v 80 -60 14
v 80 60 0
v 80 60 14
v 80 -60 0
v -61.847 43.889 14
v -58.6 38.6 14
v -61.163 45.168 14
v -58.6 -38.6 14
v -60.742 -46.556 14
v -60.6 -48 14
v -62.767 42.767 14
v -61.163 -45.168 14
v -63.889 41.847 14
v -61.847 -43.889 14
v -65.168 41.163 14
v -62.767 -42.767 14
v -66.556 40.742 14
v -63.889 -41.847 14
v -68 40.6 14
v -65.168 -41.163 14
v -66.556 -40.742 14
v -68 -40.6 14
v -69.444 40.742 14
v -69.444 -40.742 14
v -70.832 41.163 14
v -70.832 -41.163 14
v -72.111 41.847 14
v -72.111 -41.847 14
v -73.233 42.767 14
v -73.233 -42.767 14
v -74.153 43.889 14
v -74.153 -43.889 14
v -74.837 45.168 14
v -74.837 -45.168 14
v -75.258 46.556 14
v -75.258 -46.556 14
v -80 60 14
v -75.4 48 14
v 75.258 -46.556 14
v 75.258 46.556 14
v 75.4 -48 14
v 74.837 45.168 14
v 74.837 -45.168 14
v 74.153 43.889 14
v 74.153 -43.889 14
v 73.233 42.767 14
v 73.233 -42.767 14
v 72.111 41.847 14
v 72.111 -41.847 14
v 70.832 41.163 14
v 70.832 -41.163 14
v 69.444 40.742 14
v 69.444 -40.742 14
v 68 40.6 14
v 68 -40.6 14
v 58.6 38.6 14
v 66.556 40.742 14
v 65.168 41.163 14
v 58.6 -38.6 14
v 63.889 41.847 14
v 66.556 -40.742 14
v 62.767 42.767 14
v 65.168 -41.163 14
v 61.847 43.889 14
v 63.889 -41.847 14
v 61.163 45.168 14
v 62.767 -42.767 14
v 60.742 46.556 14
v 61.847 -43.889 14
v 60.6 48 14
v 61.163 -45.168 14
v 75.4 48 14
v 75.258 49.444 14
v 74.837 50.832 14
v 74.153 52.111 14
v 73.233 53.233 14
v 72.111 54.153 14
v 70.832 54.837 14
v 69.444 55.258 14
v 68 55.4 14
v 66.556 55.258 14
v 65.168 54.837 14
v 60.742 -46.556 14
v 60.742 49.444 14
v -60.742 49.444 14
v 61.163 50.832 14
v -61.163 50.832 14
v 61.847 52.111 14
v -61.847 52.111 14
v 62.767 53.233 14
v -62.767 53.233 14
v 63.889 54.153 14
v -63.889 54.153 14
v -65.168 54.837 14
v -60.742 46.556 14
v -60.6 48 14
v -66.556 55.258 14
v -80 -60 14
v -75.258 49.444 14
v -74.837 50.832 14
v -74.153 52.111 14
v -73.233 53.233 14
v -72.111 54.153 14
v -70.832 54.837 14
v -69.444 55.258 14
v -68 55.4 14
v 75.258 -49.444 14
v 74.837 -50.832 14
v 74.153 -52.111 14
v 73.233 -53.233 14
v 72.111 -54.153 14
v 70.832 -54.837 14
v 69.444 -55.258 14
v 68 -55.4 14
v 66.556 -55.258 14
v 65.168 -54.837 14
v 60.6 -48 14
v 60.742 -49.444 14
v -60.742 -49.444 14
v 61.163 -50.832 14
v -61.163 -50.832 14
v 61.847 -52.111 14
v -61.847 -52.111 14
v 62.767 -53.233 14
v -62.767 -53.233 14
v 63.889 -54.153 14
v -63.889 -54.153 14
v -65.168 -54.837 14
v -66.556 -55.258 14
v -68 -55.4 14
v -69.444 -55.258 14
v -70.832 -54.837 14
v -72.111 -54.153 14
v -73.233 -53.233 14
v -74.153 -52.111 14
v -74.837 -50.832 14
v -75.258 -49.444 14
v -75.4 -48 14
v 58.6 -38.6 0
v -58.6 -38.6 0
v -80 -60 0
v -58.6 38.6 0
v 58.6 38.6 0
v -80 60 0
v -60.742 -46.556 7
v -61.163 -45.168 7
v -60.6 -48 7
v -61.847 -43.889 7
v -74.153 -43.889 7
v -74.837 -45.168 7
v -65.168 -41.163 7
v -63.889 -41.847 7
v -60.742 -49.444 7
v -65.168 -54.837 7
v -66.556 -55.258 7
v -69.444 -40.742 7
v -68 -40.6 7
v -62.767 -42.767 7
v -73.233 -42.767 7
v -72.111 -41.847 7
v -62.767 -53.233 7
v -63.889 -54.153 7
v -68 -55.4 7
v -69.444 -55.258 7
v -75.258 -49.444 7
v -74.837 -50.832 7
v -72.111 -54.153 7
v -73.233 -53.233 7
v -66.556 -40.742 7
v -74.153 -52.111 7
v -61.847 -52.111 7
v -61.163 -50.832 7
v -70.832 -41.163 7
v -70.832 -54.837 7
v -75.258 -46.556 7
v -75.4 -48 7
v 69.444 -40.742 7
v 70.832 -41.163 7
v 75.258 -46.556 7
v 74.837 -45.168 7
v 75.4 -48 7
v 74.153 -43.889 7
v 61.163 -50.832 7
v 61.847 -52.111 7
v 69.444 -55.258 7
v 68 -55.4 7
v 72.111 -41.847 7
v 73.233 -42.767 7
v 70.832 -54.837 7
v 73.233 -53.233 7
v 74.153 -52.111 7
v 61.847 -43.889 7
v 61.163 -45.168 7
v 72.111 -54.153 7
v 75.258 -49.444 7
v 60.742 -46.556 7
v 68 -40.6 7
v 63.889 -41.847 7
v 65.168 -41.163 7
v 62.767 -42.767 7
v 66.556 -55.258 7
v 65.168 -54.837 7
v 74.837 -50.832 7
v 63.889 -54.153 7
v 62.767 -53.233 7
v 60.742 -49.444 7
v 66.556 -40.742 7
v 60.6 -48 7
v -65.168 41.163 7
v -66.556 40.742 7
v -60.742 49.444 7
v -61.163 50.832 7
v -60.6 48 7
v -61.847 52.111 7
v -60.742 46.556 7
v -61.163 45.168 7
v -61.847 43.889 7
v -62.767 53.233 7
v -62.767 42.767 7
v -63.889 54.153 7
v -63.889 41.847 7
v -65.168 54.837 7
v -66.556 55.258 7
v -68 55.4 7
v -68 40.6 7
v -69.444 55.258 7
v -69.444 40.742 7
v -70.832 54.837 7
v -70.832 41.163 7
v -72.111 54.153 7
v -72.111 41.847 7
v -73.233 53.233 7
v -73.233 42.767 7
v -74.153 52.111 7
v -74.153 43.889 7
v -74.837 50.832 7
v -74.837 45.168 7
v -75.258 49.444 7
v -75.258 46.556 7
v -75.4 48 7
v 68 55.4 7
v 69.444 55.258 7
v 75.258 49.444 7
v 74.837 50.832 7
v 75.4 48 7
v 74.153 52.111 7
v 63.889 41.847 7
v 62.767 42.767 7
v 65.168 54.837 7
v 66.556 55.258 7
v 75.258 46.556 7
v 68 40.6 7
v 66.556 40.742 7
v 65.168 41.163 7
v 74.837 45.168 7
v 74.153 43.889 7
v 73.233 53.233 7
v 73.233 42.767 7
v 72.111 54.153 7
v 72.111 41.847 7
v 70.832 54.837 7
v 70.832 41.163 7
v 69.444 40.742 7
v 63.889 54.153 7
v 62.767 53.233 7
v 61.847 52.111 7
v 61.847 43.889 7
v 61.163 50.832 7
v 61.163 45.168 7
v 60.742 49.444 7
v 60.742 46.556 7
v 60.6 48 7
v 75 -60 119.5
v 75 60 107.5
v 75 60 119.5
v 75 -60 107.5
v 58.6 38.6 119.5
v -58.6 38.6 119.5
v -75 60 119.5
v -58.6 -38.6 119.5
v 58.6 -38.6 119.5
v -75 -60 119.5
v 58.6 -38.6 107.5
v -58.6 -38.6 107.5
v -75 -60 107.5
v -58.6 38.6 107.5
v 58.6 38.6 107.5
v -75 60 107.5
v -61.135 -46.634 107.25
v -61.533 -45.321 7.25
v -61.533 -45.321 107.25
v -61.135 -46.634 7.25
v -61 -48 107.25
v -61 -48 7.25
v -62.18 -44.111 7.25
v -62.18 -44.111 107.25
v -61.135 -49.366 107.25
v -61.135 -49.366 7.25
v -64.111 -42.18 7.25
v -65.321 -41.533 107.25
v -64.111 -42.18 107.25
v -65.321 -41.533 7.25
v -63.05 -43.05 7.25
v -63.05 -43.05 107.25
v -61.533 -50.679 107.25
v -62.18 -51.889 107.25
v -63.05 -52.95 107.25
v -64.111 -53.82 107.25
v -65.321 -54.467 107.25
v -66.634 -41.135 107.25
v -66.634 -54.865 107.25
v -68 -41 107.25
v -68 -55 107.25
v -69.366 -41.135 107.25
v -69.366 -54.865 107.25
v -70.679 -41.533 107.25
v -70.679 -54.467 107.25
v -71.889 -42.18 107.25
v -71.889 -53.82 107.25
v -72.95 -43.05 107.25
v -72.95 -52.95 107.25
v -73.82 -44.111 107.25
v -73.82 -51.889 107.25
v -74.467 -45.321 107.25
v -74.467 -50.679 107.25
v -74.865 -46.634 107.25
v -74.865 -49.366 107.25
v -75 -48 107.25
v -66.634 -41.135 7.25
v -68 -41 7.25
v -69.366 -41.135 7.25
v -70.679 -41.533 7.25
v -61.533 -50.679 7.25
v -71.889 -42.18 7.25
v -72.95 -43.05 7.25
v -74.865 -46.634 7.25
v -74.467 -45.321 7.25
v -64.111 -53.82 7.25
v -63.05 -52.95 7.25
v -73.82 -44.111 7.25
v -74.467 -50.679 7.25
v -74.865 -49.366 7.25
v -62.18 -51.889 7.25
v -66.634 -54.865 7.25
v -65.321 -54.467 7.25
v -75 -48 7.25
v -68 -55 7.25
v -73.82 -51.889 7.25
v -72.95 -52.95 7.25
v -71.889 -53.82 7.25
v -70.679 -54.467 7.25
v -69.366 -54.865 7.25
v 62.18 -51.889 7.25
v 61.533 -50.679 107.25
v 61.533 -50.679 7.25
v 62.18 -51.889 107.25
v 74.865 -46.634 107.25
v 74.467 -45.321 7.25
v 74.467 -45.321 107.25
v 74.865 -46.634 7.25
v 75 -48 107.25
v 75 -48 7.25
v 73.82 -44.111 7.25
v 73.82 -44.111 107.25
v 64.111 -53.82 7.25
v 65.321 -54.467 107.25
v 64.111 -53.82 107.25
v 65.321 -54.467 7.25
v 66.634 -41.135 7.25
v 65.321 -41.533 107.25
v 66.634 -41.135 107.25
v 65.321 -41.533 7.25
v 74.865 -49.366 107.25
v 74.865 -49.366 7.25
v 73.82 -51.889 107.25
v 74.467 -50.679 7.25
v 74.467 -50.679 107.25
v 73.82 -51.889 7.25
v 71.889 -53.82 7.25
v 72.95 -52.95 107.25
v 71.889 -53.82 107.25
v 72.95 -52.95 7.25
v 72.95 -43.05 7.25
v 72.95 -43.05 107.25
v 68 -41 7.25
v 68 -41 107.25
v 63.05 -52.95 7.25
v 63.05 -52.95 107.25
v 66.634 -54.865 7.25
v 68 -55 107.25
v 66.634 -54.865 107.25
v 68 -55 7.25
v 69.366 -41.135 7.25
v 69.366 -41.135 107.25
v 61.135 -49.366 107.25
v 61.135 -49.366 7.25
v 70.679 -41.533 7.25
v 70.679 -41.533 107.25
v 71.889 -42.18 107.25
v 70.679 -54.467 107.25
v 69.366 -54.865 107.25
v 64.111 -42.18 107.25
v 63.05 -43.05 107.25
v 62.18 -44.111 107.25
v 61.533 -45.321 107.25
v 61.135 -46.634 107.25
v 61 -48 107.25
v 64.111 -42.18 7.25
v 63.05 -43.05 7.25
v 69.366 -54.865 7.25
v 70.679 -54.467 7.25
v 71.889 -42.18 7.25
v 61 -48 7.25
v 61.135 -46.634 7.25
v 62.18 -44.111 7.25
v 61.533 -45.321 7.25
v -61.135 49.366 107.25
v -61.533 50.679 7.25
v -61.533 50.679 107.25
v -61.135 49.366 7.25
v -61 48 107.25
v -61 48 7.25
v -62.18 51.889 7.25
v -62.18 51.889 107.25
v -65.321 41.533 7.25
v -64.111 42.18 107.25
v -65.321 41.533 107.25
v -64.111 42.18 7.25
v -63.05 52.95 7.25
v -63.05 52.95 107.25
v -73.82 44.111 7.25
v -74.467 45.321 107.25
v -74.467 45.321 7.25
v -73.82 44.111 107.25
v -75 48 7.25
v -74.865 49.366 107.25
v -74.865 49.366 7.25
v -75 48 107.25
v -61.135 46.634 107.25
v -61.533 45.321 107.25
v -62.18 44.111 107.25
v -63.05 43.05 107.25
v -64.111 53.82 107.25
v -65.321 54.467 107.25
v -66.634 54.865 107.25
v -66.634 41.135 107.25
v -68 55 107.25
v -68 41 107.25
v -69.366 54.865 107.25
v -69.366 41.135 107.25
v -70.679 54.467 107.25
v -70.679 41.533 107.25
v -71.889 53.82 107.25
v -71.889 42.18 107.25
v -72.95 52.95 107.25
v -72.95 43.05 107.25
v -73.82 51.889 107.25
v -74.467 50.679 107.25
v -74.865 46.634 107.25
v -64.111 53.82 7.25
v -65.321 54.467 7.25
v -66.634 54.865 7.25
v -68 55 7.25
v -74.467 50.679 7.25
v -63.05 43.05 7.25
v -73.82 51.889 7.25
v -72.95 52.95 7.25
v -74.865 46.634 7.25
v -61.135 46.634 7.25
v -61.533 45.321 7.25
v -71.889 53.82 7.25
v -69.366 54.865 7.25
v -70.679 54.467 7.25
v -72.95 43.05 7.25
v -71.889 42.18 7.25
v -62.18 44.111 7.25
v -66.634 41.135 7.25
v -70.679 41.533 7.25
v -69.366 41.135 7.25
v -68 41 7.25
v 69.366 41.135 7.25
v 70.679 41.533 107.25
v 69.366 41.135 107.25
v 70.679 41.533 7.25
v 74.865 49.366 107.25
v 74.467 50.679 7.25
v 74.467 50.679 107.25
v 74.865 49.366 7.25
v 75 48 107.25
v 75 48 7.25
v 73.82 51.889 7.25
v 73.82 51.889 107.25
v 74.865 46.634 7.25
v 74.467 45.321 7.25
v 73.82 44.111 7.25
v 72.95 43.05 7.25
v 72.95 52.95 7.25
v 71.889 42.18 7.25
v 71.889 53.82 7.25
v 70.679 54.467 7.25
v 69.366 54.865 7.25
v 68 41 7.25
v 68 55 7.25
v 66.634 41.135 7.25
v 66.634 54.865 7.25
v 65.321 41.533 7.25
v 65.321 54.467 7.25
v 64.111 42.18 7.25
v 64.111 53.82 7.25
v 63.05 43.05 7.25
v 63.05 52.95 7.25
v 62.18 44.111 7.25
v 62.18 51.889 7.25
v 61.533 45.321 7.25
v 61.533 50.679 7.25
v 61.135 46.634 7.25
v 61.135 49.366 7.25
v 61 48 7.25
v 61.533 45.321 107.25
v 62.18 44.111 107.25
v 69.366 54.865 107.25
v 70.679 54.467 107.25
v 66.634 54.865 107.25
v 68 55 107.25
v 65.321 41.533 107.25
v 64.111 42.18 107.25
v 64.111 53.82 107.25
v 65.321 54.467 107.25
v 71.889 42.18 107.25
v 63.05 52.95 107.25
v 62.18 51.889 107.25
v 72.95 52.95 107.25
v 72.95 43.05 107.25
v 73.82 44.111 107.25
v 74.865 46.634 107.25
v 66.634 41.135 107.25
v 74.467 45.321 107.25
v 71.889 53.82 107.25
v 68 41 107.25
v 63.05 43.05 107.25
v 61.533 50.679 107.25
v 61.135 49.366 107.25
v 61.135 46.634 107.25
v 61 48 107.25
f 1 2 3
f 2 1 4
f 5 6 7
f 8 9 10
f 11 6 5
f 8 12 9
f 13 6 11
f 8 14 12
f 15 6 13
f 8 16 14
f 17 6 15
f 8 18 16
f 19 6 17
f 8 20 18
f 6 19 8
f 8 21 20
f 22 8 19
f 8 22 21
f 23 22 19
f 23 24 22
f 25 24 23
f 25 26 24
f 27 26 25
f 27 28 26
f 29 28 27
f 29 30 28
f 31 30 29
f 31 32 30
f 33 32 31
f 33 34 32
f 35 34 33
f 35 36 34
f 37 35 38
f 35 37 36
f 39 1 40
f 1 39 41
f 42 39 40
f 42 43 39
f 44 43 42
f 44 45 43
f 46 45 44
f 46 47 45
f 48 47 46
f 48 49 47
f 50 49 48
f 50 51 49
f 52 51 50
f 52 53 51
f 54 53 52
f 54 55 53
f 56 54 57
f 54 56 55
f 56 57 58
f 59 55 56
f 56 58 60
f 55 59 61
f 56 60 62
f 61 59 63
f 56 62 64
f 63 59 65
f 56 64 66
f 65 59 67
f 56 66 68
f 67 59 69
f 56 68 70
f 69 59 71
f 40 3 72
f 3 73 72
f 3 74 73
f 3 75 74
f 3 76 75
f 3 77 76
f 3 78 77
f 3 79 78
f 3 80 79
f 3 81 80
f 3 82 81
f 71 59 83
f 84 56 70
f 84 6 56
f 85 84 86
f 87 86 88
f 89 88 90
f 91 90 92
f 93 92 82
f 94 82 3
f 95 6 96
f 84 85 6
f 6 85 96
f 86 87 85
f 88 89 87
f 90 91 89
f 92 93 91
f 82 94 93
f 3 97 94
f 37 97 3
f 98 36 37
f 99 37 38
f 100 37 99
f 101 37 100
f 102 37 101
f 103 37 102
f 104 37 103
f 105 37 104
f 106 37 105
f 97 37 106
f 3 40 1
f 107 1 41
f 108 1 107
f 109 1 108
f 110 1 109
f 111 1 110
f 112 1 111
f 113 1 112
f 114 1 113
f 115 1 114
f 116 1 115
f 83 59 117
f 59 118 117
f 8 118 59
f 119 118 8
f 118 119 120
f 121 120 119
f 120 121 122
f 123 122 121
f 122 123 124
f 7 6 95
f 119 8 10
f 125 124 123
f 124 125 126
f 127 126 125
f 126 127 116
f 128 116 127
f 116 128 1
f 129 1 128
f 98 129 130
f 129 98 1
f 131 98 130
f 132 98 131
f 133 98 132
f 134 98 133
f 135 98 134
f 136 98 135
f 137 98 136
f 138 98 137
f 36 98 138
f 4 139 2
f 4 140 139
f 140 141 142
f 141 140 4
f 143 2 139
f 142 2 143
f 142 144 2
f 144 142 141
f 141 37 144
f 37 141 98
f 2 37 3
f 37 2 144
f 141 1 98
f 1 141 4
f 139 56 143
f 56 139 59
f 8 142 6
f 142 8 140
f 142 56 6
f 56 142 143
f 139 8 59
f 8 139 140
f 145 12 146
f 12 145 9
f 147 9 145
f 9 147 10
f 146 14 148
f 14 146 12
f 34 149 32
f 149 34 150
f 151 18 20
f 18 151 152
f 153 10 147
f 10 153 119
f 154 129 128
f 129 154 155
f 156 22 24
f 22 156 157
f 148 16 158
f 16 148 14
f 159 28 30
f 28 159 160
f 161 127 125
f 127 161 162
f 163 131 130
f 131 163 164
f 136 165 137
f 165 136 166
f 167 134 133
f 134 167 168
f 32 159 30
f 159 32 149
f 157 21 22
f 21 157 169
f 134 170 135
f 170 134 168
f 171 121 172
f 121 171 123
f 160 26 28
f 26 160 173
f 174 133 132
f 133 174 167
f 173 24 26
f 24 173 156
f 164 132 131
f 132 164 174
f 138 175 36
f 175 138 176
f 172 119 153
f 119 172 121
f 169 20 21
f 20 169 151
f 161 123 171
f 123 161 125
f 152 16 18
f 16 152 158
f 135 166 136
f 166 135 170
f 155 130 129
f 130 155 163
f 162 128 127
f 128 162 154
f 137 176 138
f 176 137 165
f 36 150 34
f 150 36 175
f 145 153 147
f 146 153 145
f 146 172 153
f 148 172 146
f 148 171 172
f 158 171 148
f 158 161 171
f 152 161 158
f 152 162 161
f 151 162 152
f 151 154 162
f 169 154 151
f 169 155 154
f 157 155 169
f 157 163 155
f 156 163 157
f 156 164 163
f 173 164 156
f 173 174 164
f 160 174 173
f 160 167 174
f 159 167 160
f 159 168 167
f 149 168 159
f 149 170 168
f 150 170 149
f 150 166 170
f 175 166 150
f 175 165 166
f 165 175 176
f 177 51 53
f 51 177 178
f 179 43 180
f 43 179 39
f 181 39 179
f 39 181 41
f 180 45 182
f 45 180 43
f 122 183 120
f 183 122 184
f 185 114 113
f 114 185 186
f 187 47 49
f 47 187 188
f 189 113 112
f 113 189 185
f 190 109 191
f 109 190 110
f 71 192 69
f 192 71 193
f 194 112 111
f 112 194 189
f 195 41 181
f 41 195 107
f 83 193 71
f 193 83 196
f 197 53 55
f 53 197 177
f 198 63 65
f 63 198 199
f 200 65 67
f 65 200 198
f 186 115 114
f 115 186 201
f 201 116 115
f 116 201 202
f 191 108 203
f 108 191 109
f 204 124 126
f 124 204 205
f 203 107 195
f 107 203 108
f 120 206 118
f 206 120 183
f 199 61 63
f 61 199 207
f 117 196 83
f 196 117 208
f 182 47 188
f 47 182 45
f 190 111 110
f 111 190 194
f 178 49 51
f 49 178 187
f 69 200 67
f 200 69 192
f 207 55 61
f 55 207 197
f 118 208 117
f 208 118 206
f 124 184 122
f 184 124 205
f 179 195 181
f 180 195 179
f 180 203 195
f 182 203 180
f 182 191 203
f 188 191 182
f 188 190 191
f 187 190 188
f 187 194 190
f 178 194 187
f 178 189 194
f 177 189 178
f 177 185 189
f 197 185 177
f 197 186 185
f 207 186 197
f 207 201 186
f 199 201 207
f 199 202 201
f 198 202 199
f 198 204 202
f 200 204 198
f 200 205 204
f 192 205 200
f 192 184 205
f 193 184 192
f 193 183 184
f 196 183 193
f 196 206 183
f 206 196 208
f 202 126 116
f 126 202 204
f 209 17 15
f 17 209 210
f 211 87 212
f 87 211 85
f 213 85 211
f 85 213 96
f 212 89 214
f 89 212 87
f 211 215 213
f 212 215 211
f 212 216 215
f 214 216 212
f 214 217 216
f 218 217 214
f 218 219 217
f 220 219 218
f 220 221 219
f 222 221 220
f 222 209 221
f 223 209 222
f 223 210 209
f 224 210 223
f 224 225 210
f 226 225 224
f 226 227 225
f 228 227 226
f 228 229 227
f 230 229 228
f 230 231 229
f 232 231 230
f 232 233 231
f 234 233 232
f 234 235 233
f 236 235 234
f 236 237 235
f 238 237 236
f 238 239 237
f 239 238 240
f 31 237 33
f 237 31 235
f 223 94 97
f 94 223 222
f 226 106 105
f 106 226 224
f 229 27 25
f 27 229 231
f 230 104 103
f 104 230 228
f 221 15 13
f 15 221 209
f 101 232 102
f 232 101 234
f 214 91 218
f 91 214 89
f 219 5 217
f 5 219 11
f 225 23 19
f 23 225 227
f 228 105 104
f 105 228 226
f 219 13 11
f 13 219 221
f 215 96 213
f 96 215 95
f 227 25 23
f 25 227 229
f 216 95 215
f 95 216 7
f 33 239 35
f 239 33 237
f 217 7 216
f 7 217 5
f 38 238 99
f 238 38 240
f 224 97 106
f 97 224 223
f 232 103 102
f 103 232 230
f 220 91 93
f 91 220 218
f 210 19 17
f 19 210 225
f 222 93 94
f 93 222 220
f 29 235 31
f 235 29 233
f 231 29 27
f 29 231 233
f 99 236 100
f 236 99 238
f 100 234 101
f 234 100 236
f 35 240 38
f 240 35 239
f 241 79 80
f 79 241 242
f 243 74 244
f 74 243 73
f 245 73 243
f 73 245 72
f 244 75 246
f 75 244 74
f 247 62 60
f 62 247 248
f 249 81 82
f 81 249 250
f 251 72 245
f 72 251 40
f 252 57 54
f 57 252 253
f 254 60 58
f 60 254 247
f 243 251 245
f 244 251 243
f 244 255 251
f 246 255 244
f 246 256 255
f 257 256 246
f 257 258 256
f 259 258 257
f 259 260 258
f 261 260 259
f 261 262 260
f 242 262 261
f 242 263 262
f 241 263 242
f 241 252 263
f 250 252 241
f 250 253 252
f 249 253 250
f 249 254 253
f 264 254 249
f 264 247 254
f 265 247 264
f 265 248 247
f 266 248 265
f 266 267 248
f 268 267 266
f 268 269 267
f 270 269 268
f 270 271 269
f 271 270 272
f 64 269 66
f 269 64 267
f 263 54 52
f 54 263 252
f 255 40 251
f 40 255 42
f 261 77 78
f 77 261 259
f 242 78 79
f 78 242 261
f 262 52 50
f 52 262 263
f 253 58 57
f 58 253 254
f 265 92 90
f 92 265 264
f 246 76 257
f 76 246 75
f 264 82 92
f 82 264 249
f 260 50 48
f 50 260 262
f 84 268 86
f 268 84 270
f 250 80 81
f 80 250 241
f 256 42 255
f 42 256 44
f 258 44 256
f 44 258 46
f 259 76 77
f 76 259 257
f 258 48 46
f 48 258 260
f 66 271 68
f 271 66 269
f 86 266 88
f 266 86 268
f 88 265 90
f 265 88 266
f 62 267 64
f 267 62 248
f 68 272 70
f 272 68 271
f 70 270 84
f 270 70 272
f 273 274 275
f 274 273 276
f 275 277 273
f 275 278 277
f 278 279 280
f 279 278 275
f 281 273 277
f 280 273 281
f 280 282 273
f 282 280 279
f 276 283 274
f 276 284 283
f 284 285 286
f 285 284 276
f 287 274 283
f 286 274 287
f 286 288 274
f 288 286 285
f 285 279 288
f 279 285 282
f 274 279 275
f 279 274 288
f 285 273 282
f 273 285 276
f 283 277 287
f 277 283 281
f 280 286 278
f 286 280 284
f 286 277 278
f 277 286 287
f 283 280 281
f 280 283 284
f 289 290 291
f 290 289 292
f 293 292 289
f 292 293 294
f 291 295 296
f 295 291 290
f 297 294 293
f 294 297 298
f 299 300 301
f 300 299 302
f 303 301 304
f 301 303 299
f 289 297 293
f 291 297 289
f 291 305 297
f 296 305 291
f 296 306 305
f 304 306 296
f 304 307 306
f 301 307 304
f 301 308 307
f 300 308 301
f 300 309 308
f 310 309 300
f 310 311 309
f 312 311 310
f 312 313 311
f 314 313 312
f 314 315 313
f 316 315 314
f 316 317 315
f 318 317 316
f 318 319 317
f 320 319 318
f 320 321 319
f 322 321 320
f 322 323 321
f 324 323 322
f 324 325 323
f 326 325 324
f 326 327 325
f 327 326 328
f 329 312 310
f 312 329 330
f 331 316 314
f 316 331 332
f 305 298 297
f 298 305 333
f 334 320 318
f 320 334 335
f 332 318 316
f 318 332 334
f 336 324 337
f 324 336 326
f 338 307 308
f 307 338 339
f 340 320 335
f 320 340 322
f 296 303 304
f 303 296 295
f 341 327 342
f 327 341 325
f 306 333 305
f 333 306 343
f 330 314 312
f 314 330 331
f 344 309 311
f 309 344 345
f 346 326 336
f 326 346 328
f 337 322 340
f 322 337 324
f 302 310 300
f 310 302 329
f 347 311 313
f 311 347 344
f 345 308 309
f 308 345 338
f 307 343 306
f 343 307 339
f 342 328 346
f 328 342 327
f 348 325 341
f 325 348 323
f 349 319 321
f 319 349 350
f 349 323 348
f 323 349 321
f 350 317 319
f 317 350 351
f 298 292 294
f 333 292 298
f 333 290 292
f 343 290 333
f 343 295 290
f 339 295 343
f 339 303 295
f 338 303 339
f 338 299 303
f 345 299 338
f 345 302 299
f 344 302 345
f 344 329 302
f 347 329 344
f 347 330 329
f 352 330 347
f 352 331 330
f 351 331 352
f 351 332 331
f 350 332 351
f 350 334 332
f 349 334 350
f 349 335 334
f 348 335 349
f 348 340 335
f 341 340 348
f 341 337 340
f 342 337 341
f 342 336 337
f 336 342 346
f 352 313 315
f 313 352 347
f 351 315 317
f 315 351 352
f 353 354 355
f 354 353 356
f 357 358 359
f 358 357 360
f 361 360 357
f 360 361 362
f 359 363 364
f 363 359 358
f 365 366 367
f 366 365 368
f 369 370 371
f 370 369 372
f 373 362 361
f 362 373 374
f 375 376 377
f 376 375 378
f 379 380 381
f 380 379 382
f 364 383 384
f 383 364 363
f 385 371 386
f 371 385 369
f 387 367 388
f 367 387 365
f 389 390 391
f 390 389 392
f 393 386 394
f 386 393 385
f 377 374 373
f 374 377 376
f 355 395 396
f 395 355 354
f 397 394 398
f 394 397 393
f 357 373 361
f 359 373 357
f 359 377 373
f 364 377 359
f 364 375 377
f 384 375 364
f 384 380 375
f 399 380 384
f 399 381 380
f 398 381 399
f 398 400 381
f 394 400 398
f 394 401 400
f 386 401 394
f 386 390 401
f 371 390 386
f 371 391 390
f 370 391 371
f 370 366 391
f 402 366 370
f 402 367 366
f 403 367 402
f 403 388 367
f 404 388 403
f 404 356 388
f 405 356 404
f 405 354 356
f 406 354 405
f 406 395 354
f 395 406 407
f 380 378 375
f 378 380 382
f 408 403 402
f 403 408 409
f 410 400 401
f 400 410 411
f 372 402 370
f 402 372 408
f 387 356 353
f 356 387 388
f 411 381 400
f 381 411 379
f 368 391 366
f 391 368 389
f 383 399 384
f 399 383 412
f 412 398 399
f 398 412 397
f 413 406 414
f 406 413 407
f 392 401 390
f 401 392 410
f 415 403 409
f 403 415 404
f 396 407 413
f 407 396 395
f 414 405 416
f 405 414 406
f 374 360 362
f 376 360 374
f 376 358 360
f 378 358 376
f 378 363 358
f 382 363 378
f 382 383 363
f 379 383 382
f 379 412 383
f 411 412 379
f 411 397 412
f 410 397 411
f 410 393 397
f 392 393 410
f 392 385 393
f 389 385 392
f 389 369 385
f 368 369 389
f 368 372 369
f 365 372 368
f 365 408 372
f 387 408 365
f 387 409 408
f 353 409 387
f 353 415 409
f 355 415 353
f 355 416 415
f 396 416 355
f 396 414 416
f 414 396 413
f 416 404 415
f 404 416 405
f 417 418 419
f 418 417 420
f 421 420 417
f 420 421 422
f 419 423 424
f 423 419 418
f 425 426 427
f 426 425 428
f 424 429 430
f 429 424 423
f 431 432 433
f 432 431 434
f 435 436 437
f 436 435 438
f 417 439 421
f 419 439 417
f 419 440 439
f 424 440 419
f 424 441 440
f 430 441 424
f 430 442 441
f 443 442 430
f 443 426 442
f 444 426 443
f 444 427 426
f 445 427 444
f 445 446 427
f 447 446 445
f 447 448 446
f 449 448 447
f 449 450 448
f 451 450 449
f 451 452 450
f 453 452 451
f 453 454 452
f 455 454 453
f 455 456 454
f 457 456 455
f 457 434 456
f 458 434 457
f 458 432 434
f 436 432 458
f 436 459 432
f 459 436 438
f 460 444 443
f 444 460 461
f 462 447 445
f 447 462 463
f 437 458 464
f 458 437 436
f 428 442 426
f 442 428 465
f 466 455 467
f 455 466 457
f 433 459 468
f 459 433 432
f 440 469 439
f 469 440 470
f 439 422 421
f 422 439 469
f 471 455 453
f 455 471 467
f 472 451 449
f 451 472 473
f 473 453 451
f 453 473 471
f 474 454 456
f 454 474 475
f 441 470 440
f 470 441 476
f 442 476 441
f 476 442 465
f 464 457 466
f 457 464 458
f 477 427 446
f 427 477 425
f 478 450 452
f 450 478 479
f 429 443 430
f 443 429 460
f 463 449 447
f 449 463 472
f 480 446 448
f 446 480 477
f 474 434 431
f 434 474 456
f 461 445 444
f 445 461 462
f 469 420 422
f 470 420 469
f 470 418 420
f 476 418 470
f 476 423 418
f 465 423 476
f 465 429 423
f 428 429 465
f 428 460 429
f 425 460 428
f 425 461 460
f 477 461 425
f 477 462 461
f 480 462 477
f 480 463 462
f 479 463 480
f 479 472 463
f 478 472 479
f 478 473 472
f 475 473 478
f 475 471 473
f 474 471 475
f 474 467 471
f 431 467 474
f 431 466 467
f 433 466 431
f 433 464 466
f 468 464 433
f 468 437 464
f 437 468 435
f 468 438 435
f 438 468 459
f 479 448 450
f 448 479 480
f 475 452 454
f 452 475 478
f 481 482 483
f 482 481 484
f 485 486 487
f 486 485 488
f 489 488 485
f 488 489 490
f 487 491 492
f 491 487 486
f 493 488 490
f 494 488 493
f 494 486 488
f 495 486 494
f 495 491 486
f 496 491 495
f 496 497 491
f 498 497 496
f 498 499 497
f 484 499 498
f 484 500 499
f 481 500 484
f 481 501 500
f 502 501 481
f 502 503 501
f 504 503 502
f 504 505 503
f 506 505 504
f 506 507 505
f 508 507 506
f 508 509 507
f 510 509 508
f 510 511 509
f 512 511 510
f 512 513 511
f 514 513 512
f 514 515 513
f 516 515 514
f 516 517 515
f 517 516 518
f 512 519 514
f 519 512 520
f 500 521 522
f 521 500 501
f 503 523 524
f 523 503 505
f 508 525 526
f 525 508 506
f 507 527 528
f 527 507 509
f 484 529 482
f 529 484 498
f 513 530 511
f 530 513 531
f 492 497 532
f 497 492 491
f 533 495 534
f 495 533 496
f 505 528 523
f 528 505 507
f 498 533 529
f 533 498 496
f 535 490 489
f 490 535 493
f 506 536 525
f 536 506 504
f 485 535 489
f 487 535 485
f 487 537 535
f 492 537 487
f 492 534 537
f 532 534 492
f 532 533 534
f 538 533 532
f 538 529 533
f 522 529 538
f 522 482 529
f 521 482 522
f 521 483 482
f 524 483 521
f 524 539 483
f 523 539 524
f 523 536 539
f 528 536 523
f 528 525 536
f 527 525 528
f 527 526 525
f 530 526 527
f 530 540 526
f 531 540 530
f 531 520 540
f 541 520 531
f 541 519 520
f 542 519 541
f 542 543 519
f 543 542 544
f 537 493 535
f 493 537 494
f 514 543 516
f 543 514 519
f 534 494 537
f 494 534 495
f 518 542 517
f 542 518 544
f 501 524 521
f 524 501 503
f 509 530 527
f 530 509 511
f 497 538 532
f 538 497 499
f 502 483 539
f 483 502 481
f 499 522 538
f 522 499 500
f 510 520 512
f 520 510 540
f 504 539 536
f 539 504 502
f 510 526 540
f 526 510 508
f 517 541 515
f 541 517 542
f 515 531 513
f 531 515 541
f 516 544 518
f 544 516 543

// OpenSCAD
$fn = 32;

// ------------------------------------------------------------------------
// Frame cube: base 160 x 120 mm, posts 100 mm tall
// Every part is its own module, assembly() places every instance.
// ------------------------------------------------------------------------

// --- part 1 ---
module base_frame() {
  difference() {
    translate([-80, -60, 0]) cube([160, 120, 14]);
    translate([-58.6, -38.6, -1]) cube([117.2, 77.2, 16]);
    translate([-68, -48, 7]) cylinder(h = 8, d = 14.8);
    translate([68, -48, 7]) cylinder(h = 8, d = 14.8);
    translate([-68, 48, 7]) cylinder(h = 8, d = 14.8);
    translate([68, 48, 7]) cylinder(h = 8, d = 14.8);
  }
}

// --- part 2 ---
module corner_post() {
  cylinder(h = 100, d = 14);
}

// --- part 3 ---
module top_frame() {
  difference() {
    translate([-75, -60, 0]) cube([150, 120, 12]);
    translate([-58.6, -38.6, -1]) cube([117.2, 77.2, 14]);
  }
}

// --- assembly ---
module assembly() {
  color([0.80, 0.24, 0.20]) translate([0, 0, 0]) rotate([0, 0, 0]) base_frame();
  color([0.20, 0.45, 0.75]) translate([-68, -48, 7.25]) rotate([0, 0, 0]) corner_post();
  color([0.25, 0.62, 0.32]) translate([68, -48, 7.25]) rotate([0, 0, 0]) corner_post();
  color([0.92, 0.70, 0.18]) translate([-68, 48, 7.25]) rotate([0, 0, 0]) corner_post();
  color([0.58, 0.35, 0.70]) translate([68, 48, 7.25]) rotate([0, 0, 0]) corner_post();
  color([0.16, 0.66, 0.66]) translate([0, 0, 107.5]) rotate([0, 0, 0]) top_frame();
}

assembly();
